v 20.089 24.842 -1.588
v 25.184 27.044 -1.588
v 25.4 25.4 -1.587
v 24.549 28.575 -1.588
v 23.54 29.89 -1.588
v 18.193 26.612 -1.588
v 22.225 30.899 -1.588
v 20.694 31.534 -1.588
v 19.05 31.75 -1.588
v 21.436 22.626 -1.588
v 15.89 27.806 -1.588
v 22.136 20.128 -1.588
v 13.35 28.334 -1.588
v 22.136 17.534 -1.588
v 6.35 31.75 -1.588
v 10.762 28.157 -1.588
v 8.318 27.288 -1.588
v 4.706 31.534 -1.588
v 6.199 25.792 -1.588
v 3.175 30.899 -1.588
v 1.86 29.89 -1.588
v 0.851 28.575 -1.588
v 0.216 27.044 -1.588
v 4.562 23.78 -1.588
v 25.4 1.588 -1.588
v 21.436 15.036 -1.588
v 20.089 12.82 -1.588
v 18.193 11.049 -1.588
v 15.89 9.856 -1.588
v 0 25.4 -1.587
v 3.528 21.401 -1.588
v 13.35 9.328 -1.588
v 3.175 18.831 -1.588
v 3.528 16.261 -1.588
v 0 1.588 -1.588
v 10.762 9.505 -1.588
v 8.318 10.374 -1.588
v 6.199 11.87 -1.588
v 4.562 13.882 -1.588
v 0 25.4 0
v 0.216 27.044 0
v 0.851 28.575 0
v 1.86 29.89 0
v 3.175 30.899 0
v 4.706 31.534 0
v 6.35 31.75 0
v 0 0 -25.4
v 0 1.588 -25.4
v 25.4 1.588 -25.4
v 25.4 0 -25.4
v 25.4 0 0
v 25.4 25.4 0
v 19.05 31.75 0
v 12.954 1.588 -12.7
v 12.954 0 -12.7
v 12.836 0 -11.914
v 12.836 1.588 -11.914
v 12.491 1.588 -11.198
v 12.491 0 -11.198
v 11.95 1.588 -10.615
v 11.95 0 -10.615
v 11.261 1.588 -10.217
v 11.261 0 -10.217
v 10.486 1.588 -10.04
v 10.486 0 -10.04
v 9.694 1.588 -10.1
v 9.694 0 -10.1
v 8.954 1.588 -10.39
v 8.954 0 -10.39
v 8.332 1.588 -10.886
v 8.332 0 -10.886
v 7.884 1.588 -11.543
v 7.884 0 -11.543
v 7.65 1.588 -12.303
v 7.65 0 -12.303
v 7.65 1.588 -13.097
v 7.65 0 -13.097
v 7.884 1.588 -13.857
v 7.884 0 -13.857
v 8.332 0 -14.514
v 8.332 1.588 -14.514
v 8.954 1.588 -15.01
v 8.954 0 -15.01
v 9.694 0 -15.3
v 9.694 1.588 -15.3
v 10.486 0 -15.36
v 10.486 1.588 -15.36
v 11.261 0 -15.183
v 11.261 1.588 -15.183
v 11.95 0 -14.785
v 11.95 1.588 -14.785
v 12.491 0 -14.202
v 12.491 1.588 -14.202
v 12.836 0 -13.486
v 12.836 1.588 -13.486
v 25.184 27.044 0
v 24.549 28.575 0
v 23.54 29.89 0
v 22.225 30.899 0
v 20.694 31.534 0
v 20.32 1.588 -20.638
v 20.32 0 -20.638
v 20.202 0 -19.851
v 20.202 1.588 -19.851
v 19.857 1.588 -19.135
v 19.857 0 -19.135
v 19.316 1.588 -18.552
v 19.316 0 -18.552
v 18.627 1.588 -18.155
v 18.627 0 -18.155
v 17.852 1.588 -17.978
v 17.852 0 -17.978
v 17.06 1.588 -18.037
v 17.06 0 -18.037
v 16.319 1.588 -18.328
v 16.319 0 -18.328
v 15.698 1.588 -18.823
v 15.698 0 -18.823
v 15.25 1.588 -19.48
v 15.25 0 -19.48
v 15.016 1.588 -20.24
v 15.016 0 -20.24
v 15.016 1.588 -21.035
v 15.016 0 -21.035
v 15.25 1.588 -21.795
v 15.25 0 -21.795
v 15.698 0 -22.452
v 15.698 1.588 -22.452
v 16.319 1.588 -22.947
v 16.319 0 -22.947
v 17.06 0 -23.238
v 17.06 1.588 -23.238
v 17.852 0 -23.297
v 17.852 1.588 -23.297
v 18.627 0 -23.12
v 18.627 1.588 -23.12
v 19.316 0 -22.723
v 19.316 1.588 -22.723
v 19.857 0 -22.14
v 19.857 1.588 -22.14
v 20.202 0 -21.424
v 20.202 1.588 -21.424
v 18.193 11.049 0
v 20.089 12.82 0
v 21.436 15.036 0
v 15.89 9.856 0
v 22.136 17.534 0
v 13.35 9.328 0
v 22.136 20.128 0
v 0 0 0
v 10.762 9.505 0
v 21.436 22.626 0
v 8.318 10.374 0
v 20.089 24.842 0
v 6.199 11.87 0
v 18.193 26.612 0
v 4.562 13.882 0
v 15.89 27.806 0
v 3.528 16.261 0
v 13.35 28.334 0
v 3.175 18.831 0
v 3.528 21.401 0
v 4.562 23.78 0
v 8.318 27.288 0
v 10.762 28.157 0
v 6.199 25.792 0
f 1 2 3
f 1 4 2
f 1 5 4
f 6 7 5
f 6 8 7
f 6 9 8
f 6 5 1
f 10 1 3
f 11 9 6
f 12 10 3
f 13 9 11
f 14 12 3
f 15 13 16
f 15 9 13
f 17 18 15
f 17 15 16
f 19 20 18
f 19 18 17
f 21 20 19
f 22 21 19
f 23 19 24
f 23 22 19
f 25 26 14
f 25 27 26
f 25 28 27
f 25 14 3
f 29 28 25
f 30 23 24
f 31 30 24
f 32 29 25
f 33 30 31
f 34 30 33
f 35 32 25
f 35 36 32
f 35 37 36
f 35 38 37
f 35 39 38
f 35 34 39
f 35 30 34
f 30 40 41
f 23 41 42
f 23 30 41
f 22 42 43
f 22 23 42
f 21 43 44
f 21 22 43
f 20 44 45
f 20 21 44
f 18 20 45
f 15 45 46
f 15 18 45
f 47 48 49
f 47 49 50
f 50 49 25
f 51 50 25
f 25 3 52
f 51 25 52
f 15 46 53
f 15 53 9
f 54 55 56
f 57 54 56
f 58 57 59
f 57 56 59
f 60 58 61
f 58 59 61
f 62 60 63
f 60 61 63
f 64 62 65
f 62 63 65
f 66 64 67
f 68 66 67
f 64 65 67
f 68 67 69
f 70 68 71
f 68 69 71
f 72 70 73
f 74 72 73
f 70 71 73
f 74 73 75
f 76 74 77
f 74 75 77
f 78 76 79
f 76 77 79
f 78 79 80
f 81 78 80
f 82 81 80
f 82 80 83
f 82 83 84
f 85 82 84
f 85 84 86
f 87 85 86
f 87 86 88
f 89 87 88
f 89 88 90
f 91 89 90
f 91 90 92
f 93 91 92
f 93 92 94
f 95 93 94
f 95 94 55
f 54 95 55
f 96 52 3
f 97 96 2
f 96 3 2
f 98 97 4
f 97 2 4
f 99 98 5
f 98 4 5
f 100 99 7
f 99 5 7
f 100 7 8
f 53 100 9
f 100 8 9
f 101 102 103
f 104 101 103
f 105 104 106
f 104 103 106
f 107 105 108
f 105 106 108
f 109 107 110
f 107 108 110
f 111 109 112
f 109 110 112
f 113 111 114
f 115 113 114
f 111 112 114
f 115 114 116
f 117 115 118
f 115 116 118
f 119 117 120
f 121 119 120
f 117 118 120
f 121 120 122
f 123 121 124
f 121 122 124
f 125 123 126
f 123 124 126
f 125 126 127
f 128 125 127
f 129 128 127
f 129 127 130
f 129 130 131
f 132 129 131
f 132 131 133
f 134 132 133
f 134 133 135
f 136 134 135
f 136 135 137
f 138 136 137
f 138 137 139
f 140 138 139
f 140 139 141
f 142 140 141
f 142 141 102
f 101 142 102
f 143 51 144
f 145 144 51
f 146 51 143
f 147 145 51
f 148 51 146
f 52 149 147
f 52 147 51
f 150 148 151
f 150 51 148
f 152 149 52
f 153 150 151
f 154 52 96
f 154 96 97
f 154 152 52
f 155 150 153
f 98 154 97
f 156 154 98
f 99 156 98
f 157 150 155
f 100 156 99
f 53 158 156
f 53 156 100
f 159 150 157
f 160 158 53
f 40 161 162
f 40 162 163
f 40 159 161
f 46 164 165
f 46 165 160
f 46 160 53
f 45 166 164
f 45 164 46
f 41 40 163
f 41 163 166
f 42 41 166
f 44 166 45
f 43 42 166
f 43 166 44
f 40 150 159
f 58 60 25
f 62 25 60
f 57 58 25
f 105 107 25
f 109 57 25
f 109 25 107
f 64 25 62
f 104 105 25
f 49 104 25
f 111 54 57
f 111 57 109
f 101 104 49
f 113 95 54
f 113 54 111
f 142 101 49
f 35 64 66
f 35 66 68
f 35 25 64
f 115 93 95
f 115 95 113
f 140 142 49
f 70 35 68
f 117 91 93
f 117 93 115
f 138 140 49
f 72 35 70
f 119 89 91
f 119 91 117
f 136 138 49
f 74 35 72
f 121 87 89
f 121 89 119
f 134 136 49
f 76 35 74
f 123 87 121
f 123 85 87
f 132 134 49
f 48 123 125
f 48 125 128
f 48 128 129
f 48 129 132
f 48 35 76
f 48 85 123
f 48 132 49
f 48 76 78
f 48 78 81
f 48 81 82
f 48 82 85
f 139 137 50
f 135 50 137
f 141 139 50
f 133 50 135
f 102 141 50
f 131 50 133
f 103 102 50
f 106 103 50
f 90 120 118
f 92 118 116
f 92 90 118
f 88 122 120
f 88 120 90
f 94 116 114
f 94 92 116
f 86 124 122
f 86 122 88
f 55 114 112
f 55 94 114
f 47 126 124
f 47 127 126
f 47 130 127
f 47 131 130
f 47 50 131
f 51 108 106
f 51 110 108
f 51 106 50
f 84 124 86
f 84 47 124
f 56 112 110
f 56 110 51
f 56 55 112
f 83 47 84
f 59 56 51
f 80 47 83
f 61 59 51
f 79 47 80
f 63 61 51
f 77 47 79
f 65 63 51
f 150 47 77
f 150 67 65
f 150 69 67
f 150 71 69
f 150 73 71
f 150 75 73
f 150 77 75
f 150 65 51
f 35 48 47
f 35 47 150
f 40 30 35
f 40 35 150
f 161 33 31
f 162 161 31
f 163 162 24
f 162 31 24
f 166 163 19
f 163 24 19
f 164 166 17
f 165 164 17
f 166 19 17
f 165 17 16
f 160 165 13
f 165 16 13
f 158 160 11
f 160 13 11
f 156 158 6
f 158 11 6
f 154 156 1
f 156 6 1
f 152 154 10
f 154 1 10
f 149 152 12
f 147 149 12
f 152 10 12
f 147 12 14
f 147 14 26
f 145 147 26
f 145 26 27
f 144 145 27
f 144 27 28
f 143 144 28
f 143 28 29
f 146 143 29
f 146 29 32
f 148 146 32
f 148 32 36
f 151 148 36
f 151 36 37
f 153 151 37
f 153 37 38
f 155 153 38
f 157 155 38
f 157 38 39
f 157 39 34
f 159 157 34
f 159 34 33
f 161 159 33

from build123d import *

# Parameters (mm, degrees)
BOSS_EXTRUDE1_DEPTH = 25.4
CUT_EXTRUDE1_REACH  = 3.587
SKETCH2_R           = 9.525
FILLET1_R           = 6.35
CUT_EXTRUDE2_REACH  = 33.75
SKETCH3_R           = 2.667


with BuildPart() as part:
    # Sketch1 → Boss-Extrude1 (new body)
    with BuildSketch(Plane(origin=(0, 0, 0), x_dir=(0, 0, -1), z_dir=(1, 0, 0))):
        Polygon((1.5875, 1.5875), (25.4, 1.5875), (25.4, 0), (0, 0), (0, 31.75), (1.5875, 31.75), align=None)
    extrude(amount=BOSS_EXTRUDE1_DEPTH)

    # Sketch2 → Cut-Extrude1 (cut, up to next)
    with BuildSketch(Plane(origin=(0, 0, -1.5875), x_dir=(-1, 0, 0), z_dir=(0, 0, -1)), mode=Mode.PRIVATE) as cut_extrude1_sk1:
        with Locations((-12.7, 18.830747356)):
            Circle(SKETCH2_R)
    cut_extrude1_tool1 = extrude(cut_extrude1_sk1.sketch, amount=-CUT_EXTRUDE1_REACH, mode=Mode.PRIVATE) & part.part
    add(cut_extrude1_tool1.solids().sort_by_distance((12.7, 18.830747, -1.5875))[0], mode=Mode.SUBTRACT)

    # Fillet1
    fillet1_edges = [part.edges().sort_by_distance(p)[0] for p in [
        (25.4, 31.75, -0.79375),
        (0, 31.75, -0.79375),
    ]]
    fillet(fillet1_edges, radius=FILLET1_R)

    # Sketch3 → Cut-Extrude2 (cut, up to next)
    with BuildSketch(Plane.XZ, mode=Mode.PRIVATE) as cut_extrude2_sk1:
        with Locations((17.653, -20.6375)):
            Circle(SKETCH3_R)
    cut_extrude2_tool1 = extrude(cut_extrude2_sk1.sketch, amount=-CUT_EXTRUDE2_REACH, mode=Mode.PRIVATE) & part.part
    add(cut_extrude2_tool1.solids().sort_by_distance((17.653, 0, -20.6375))[0], mode=Mode.SUBTRACT)
    # Sketch3 → Cut-Extrude2 (cut, up to next)
    with BuildSketch(Plane.XZ, mode=Mode.PRIVATE) as cut_extrude2_sk2:
        with Locations((10.287, -12.7)):
            Circle(SKETCH3_R)
    cut_extrude2_tool2 = extrude(cut_extrude2_sk2.sketch, amount=-CUT_EXTRUDE2_REACH, mode=Mode.PRIVATE) & part.part
    add(cut_extrude2_tool2.solids().sort_by_distance((10.287, 0, -12.7))[0], mode=Mode.SUBTRACT)


solid = part.part
